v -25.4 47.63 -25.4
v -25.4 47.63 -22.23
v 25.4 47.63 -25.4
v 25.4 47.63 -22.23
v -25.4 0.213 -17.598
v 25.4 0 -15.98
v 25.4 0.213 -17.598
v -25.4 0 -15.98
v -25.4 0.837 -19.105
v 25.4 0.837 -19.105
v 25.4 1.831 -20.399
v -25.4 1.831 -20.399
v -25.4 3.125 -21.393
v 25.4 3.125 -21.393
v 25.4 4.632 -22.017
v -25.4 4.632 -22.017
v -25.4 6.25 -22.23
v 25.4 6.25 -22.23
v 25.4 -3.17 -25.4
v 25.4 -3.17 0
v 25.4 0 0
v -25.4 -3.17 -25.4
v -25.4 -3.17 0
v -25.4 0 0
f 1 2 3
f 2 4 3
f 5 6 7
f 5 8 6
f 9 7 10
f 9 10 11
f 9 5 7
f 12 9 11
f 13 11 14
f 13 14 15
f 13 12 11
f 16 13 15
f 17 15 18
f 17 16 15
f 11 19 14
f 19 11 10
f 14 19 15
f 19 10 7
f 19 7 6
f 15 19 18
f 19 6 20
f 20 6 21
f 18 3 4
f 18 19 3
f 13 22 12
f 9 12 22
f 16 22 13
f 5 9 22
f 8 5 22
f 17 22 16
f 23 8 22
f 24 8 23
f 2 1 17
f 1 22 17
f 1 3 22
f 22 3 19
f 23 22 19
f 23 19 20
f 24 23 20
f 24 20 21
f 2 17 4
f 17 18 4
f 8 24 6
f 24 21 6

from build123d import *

# Parameters (mm, degrees)
BOSS_EXTRUDE1_DEPTH = 25.4
FILLET1_R           = 6.25


with BuildPart() as part:
    # Sketch1 → Boss-Extrude1 (new body, symmetric)
    with BuildSketch(Plane(origin=(0, 0, 0), x_dir=(0, 0, -1), z_dir=(1, 0, 0))):
        Polygon((0, 0), (22.23, 0), (22.23, 47.63), (25.4, 47.63), (25.4, -3.17), (0, -3.17), align=None)
    extrude(amount=BOSS_EXTRUDE1_DEPTH, both=True)

    # Fillet1
    fillet1_edges = [part.edges().sort_by_distance(p)[0] for p in [
        (0, 0, -22.23),
    ]]
    fillet(fillet1_edges, radius=FILLET1_R)


solid = part.part
